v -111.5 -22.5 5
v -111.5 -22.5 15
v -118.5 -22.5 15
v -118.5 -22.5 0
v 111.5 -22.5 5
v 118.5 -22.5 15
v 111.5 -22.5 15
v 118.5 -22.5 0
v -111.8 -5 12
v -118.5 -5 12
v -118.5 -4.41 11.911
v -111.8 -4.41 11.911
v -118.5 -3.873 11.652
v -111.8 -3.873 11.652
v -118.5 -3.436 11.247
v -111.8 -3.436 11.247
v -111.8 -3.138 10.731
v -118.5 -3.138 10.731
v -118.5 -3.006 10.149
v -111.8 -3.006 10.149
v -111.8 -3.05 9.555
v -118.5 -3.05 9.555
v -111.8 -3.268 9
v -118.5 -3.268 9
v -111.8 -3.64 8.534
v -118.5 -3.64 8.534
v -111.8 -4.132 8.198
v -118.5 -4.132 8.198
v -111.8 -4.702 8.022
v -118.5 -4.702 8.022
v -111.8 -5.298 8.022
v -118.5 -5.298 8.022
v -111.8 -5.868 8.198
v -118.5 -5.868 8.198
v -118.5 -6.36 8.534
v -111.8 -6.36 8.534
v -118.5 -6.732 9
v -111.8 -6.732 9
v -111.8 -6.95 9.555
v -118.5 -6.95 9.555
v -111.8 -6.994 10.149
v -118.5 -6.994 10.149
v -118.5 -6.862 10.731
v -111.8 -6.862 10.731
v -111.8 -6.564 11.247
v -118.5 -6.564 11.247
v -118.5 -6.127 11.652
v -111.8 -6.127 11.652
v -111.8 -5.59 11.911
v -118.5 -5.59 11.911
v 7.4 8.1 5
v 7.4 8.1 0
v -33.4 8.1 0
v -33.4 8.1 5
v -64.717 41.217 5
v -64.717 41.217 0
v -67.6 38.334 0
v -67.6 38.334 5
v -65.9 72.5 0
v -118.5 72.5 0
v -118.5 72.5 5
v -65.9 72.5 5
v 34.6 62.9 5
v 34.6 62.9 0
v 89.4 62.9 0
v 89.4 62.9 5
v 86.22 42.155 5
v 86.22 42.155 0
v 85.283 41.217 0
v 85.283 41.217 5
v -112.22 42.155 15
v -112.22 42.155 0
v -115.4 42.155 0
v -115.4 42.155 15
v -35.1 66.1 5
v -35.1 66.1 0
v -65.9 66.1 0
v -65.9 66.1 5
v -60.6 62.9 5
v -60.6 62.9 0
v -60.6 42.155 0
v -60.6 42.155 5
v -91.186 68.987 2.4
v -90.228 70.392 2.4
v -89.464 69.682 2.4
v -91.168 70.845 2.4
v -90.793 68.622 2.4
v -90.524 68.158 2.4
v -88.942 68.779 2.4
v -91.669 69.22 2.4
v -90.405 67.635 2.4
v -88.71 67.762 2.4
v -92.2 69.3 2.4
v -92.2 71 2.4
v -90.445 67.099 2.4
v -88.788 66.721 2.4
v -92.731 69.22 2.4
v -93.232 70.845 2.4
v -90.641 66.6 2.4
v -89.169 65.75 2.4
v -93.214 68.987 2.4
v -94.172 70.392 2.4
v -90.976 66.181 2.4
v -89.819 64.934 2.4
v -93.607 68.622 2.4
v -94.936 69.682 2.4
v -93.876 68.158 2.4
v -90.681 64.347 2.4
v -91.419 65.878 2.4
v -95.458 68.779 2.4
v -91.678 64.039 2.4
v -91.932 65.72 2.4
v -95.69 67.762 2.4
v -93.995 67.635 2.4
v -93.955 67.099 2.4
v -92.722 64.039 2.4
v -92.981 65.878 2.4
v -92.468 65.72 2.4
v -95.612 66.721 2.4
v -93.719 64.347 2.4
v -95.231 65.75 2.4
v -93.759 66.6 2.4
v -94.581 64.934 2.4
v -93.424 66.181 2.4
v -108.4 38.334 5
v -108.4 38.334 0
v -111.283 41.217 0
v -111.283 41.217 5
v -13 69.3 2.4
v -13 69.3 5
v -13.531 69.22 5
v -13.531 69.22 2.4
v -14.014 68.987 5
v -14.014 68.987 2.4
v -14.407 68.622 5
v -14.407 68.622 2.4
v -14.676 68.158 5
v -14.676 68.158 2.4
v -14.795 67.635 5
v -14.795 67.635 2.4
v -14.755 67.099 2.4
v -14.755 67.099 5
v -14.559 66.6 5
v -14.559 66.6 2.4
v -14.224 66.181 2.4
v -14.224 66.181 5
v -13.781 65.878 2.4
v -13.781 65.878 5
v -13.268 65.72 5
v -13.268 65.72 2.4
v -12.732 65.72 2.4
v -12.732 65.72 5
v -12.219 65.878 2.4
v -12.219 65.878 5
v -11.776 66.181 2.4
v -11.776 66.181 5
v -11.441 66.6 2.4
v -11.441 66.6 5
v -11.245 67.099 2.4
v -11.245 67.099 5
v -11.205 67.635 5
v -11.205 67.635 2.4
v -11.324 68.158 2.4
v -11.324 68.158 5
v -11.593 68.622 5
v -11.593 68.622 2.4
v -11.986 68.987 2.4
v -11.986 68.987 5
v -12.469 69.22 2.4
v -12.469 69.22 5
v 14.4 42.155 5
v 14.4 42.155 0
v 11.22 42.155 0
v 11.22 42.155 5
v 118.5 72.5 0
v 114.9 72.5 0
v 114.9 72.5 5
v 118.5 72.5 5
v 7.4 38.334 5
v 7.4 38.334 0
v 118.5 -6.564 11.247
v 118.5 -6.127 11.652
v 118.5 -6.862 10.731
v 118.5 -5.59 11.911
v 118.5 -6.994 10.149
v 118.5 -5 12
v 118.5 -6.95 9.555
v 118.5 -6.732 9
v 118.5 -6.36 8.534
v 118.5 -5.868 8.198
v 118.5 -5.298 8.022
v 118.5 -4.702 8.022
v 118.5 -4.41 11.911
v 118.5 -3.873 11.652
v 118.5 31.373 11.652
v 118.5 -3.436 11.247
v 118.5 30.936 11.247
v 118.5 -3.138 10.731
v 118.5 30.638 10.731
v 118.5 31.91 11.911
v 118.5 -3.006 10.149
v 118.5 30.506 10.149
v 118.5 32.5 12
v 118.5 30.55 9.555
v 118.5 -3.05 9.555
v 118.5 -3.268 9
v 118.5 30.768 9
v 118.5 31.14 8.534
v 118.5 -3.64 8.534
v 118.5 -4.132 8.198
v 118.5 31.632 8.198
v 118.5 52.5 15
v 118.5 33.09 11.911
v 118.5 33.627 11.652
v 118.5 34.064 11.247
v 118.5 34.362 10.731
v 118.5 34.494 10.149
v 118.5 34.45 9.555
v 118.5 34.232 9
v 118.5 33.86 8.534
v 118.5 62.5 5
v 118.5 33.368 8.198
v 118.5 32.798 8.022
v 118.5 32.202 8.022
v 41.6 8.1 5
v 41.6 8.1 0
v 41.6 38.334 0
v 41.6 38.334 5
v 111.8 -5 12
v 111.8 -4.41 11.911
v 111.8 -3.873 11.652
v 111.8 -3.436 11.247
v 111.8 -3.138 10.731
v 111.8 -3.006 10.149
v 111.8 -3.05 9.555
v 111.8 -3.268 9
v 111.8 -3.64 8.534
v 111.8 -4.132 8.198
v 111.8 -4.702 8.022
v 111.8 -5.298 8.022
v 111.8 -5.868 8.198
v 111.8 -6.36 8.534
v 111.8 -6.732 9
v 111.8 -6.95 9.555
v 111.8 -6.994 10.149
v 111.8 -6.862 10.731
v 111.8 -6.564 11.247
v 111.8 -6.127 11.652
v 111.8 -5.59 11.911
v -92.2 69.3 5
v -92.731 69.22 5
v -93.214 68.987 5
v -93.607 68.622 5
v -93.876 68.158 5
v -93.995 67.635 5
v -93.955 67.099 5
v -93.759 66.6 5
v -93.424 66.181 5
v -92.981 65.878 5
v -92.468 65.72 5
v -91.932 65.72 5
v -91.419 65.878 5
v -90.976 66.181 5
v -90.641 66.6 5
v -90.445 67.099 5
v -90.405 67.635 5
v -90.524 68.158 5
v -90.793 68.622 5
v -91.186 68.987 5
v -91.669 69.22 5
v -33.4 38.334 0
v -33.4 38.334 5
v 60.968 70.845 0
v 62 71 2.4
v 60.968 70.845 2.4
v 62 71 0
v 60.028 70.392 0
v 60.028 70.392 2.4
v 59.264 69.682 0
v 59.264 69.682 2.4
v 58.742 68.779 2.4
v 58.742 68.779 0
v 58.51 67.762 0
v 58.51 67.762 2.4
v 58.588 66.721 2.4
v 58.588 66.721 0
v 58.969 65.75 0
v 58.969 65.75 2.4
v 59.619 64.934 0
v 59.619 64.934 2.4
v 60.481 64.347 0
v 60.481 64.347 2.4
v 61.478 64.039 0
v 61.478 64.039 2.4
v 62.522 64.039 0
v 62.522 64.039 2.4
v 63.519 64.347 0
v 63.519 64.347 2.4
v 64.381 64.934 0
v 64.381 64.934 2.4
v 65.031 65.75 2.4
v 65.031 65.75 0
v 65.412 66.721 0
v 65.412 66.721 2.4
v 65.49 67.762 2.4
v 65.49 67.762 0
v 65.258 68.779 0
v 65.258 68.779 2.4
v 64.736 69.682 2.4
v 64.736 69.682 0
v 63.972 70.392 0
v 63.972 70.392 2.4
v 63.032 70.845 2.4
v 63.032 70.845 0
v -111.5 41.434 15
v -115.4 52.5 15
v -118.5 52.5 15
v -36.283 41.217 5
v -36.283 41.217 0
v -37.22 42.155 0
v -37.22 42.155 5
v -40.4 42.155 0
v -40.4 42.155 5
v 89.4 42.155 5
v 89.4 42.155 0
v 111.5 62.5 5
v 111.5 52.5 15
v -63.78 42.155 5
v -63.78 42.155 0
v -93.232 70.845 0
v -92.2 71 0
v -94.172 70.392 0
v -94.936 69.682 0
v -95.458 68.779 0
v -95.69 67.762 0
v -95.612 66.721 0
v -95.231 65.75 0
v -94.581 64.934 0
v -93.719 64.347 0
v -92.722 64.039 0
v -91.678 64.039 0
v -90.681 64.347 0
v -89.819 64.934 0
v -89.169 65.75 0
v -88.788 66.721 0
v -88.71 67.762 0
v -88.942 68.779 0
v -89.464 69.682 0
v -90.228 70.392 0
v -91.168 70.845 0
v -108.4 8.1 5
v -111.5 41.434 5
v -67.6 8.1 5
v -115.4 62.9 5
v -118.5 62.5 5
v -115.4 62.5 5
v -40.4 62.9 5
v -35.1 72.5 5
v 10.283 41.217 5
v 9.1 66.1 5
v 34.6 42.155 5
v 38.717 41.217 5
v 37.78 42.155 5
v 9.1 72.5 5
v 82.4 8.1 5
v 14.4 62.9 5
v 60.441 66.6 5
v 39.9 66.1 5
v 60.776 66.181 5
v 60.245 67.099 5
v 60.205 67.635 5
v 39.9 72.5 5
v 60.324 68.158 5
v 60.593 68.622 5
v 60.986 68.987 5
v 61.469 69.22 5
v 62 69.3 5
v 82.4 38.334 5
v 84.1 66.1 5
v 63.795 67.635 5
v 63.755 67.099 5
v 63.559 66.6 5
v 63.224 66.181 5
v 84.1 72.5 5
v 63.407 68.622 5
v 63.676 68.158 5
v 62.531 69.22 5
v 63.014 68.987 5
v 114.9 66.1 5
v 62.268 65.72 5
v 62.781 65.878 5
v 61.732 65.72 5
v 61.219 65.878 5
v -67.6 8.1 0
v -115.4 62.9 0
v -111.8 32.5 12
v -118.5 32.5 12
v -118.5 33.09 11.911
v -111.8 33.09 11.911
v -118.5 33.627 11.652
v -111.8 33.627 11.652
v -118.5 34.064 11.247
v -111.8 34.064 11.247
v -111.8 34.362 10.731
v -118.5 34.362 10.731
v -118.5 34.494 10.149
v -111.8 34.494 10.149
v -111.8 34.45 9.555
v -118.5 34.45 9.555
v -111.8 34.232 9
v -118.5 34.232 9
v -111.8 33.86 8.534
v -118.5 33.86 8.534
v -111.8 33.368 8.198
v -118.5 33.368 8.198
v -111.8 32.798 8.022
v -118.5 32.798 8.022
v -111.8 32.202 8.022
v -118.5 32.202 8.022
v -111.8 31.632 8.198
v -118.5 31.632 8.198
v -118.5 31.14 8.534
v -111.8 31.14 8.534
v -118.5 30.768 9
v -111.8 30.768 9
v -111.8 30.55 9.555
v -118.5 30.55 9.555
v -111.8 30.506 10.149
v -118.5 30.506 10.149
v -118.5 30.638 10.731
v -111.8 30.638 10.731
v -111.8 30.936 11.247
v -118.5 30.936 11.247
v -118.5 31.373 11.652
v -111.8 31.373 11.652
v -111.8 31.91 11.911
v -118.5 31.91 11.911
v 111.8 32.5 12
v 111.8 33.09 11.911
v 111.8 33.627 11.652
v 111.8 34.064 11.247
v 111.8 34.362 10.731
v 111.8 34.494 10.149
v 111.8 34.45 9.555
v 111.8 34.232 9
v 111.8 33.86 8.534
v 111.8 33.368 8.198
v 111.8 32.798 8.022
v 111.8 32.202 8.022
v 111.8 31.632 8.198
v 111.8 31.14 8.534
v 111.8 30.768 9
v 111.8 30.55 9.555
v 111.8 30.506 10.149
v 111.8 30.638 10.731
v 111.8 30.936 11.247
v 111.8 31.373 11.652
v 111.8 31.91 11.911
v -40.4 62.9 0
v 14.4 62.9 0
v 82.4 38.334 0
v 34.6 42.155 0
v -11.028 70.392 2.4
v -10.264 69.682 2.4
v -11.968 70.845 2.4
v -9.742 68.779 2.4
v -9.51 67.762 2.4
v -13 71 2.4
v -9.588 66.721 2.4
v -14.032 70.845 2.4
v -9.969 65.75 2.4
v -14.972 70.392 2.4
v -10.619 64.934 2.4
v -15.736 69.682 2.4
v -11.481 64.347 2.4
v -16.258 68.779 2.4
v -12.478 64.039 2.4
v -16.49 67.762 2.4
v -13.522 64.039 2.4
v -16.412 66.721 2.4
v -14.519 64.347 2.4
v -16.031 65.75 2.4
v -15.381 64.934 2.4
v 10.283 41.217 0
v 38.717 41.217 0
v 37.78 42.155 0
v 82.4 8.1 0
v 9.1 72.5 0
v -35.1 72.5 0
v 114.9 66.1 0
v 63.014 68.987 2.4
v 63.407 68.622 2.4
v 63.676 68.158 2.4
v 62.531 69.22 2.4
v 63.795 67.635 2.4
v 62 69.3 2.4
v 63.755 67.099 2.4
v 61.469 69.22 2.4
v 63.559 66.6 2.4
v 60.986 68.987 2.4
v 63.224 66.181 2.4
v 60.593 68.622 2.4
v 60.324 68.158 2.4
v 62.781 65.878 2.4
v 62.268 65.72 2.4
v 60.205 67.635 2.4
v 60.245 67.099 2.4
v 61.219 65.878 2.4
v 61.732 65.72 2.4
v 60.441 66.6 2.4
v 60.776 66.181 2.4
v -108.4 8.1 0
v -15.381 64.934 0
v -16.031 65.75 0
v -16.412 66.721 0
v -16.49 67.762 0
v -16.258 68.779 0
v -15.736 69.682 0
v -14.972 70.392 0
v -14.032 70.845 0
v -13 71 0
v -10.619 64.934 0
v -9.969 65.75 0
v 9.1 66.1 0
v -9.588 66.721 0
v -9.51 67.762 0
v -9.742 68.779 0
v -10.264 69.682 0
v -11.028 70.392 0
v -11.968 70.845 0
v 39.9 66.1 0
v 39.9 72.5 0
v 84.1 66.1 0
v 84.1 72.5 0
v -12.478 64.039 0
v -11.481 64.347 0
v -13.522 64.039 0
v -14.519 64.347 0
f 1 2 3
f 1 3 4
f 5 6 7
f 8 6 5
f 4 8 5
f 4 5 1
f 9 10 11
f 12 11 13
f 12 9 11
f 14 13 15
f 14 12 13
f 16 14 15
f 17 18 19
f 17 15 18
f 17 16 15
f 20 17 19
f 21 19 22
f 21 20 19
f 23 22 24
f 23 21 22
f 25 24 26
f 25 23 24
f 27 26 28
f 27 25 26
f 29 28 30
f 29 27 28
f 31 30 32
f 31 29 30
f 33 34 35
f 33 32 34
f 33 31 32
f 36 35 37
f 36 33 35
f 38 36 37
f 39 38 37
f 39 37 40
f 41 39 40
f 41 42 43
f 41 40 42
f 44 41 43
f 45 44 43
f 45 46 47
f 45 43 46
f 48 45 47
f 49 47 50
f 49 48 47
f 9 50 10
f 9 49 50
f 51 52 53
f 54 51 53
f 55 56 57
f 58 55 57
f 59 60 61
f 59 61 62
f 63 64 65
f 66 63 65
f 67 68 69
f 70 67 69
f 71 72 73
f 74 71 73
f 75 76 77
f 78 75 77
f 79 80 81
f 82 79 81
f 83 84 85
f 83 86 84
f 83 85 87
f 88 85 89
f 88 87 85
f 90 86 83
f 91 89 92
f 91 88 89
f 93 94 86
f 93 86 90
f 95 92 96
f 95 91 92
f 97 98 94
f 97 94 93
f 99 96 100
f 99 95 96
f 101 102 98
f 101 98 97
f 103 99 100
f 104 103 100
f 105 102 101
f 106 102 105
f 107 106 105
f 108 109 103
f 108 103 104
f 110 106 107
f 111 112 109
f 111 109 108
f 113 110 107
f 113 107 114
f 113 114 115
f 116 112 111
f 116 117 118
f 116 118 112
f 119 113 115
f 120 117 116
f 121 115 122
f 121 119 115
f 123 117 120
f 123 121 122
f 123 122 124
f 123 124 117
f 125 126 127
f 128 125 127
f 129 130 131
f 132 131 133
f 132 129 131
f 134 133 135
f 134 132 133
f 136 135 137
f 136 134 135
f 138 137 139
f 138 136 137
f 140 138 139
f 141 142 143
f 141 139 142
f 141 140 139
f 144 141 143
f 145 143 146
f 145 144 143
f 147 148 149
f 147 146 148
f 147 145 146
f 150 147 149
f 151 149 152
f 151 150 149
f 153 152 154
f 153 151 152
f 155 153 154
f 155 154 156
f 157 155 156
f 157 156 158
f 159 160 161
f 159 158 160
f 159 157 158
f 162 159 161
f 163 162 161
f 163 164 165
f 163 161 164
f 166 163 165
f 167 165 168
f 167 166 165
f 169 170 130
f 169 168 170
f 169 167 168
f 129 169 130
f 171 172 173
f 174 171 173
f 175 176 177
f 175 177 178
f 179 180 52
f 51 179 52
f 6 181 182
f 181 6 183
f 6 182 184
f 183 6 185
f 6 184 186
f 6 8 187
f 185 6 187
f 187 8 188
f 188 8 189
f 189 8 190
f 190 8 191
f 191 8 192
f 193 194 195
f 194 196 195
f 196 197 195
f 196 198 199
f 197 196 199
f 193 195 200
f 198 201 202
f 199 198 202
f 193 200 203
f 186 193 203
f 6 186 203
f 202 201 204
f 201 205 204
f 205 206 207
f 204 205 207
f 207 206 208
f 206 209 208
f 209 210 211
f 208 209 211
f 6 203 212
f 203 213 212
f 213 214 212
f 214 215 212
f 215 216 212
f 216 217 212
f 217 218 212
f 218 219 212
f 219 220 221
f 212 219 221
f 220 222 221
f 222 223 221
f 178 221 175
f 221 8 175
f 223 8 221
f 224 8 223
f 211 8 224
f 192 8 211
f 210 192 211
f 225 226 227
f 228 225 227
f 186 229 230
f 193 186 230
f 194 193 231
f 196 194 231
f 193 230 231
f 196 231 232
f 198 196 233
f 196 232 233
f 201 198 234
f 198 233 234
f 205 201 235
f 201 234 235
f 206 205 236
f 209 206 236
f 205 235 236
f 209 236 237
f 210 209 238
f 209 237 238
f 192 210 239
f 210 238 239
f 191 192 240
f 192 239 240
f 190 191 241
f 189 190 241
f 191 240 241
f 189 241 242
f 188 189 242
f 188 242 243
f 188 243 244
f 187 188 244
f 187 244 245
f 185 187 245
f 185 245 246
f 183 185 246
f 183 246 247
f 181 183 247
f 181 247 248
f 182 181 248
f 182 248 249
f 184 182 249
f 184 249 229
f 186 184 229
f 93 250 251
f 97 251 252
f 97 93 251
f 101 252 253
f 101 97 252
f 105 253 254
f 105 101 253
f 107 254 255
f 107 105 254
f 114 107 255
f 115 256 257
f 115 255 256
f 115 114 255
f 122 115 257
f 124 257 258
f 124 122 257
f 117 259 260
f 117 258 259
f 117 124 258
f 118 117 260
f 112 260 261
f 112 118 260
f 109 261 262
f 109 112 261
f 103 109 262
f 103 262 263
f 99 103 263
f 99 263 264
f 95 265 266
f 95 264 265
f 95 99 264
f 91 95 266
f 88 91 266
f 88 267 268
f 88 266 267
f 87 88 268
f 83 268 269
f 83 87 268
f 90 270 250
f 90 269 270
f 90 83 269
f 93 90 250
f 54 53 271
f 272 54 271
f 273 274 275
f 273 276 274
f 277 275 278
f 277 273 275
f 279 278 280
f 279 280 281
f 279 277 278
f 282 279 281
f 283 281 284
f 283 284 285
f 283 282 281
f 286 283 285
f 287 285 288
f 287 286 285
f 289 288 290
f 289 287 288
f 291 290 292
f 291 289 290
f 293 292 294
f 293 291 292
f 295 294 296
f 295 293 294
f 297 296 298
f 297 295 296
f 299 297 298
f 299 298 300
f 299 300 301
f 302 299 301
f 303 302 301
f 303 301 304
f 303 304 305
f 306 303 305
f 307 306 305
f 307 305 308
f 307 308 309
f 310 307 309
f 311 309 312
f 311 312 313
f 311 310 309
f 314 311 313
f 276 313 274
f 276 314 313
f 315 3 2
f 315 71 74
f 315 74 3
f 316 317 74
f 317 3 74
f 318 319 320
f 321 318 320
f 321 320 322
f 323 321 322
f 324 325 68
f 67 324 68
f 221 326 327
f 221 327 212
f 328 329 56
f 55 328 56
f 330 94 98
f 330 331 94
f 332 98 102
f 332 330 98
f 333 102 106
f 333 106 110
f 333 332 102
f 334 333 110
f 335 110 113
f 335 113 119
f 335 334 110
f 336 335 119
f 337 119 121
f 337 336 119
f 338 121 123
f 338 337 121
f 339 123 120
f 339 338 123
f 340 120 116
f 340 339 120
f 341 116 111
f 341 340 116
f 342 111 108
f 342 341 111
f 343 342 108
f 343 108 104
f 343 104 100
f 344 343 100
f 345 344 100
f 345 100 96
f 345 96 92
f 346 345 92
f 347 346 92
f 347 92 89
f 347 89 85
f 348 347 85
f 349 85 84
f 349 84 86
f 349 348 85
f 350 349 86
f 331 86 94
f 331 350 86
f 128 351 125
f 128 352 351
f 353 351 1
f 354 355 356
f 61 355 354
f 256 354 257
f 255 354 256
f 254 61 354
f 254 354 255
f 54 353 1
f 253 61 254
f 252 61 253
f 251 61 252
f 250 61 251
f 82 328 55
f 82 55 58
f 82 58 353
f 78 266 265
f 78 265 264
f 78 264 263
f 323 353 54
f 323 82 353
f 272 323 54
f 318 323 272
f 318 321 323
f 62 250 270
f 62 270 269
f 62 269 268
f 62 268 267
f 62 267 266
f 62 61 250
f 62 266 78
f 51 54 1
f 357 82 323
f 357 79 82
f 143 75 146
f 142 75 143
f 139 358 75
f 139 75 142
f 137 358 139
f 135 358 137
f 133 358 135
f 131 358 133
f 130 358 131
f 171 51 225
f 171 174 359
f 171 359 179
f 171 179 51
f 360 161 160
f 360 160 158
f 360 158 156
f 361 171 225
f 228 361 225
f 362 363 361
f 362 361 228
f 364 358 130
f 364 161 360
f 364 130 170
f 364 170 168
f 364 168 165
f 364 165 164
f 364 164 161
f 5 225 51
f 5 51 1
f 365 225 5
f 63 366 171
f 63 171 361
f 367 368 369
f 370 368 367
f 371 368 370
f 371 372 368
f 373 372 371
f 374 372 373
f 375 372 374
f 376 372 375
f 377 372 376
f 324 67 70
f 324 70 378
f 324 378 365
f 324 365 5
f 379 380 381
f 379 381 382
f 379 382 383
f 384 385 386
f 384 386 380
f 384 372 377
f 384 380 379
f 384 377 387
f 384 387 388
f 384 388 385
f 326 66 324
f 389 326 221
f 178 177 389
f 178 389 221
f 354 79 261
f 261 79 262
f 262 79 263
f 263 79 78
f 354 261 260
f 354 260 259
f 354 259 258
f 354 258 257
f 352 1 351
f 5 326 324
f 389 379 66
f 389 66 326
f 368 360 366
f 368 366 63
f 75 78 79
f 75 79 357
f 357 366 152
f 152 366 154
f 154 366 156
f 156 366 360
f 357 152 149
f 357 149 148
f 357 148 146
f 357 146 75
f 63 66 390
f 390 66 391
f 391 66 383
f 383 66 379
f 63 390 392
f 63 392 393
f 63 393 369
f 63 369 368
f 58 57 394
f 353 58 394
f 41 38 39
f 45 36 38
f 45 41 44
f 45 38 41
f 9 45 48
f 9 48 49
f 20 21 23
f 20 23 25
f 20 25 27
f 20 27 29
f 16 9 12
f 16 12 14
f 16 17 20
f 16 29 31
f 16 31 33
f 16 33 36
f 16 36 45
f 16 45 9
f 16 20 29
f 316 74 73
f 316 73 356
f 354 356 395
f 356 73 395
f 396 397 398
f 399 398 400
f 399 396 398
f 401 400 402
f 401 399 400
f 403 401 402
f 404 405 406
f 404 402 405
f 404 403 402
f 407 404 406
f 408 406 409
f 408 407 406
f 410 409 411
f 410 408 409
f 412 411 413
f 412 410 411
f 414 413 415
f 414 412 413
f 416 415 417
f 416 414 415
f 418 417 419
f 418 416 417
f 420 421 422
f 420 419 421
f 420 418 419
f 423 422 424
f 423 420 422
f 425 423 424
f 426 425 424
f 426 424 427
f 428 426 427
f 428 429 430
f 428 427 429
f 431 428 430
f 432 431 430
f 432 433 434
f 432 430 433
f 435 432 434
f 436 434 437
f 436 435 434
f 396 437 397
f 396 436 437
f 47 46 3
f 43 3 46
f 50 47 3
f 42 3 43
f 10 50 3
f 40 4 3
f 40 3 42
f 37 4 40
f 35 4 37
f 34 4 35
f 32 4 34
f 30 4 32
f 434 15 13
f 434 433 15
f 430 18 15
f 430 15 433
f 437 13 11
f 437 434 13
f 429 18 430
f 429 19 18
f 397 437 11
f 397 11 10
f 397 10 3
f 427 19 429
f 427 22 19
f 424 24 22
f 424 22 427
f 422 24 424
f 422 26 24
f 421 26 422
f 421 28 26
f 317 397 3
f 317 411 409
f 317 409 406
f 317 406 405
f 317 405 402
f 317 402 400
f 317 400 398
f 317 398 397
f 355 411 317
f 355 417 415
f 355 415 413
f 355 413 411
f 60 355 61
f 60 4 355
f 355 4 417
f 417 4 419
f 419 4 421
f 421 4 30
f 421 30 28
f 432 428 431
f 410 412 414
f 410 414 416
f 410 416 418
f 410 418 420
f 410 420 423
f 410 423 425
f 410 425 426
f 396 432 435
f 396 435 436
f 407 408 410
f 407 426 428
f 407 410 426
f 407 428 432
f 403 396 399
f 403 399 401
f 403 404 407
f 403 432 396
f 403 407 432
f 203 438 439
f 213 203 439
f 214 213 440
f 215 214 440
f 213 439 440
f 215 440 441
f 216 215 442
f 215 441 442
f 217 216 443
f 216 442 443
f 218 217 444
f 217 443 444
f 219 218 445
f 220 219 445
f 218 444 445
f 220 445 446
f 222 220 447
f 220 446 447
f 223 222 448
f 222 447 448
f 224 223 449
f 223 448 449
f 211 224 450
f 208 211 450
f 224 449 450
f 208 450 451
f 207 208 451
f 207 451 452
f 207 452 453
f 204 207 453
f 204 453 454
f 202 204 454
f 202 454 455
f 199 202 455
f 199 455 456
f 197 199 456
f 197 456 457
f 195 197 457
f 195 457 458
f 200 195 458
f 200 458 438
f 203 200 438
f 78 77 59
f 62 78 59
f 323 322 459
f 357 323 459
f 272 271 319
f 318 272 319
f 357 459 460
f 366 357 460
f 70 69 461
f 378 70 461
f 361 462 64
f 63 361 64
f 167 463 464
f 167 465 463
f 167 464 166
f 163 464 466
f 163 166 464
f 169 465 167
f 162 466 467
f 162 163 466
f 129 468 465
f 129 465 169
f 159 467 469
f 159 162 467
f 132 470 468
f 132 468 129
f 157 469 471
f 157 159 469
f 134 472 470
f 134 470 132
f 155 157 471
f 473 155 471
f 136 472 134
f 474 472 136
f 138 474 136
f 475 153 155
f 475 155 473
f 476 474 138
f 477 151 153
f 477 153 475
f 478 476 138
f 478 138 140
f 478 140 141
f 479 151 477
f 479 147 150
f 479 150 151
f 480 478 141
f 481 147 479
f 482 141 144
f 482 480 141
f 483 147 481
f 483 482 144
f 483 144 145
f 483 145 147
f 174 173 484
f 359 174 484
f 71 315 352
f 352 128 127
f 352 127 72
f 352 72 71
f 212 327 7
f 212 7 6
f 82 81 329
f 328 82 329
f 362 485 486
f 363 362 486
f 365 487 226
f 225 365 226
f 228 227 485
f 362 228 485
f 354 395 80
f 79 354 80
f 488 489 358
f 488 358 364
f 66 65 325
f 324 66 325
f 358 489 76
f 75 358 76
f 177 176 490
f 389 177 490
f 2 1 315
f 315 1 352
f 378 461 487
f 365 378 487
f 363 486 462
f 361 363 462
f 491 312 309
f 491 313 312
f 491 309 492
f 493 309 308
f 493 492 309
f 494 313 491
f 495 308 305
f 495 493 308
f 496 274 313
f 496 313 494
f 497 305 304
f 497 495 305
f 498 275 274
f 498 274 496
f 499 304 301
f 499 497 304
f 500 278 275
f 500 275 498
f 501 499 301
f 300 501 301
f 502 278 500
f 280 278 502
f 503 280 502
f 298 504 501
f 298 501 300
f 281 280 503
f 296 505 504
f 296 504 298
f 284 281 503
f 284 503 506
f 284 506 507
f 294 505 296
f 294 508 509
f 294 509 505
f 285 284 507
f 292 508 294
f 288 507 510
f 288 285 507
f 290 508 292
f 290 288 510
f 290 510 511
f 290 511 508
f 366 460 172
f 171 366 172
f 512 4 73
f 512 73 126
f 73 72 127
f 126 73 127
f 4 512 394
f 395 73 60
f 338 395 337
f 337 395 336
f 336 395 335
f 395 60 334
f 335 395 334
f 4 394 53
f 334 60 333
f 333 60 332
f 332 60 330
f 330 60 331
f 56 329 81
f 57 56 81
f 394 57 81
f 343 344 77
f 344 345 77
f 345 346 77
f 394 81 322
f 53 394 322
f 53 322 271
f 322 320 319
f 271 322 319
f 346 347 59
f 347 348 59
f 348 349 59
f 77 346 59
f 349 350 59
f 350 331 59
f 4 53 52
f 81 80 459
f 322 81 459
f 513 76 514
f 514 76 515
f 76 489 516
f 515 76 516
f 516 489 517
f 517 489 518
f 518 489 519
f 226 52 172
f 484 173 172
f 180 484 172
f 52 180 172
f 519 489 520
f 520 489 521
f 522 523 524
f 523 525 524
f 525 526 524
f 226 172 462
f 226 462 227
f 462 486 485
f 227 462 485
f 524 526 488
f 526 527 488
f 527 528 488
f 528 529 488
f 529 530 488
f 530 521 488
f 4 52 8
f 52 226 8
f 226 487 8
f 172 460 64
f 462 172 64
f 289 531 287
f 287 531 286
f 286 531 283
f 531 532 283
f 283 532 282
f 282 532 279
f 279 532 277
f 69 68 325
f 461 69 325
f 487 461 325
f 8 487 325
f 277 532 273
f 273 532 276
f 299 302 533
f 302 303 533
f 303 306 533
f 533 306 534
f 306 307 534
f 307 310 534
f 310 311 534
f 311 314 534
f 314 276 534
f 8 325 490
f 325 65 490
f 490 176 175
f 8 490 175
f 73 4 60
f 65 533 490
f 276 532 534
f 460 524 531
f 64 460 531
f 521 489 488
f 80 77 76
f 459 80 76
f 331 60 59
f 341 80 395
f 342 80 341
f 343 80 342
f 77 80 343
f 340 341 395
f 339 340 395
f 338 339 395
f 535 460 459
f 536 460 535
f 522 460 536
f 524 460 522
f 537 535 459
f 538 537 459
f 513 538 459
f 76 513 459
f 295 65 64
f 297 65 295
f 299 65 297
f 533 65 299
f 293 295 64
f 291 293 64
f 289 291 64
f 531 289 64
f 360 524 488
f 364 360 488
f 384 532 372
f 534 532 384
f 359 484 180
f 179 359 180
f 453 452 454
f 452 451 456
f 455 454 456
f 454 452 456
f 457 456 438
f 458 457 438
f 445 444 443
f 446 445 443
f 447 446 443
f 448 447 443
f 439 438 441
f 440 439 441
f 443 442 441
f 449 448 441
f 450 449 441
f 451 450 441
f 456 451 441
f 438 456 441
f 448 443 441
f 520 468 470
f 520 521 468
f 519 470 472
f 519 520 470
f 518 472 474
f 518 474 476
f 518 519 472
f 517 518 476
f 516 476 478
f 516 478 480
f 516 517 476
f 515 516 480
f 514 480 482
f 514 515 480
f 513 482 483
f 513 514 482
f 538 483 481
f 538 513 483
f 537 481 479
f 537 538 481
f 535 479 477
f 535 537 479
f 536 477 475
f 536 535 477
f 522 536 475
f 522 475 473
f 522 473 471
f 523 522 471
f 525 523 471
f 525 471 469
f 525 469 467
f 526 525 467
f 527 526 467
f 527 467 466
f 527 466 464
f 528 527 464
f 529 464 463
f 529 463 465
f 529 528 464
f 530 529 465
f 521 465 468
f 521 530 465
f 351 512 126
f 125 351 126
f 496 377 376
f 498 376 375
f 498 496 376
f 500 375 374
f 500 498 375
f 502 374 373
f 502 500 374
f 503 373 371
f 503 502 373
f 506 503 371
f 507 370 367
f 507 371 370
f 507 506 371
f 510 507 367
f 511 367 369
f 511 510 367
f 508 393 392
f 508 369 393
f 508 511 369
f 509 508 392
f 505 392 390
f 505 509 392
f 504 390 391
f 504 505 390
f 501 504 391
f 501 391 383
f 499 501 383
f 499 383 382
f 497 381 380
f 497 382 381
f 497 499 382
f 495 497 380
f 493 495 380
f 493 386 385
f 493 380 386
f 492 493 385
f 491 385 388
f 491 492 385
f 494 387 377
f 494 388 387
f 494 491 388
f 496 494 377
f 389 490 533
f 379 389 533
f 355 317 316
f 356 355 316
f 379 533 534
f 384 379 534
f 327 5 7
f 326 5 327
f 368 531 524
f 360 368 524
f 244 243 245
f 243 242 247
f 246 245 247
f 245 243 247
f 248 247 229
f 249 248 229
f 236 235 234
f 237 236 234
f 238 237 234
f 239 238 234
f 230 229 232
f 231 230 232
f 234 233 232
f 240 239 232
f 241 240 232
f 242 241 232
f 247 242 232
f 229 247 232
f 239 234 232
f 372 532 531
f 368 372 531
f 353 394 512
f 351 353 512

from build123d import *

# Parameters (mm, degrees)
SZKIC1_W                                  = 237
SZKIC1_H                                  = 145
DODANIE_WYCI_GNI_CIE1_DEPTH               = 5
SZKIC2_W                                  = 7
SZKIC2_H                                  = 135
DODANIE_WYCI_GNI_CIE2_DEPTH               = 10
OTW_R_4_0_4_1_D                           = 4
OTW_R_4_0_4_1_DEPTH                       = 6.7
SFAZOWANIE1_SIZE                          = 10
WYTNIJ_WYCI_GNI_CIE1_REACH                = 141.727
SZKIC5_W                                  = 30
SZKIC5_H                                  = 6
POG_BIENIE_WALCOWE_POD_M3_RUB_Z_B_2_COUNT = 2
POG_BIENIE_WALCOWE_POD_M3_RUB_Z_B_2_PITCH = 75
POG_BIENIE_WALCOWE_POD_M3_RUB_Z_B_3_COUNT = 2
POG_BIENIE_WALCOWE_POD_M3_RUB_Z_B_3_PITCH = 154.2


with BuildPart() as part:
    # Szkic1 → Dodanie-wyciągnięcie1 (new body)
    with BuildSketch(Plane.XY):
        Rectangle(SZKIC1_W, SZKIC1_H)
    extrude(amount=DODANIE_WYCI_GNI_CIE1_DEPTH)

    # Szkic2 → Dodanie-wyciągnięcie2 (add)
    with BuildSketch(Plane.XY.offset(5)):
        with Locations((115, -5)):
            Rectangle(SZKIC2_W, SZKIC2_H)
        with Locations((-115, -5)):
            Rectangle(SZKIC2_W, SZKIC2_H)
    extrude(amount=DODANIE_WYCI_GNI_CIE2_DEPTH)

    # Otwór Ø4.0 (4)1
    with Locations(Plane(origin=(118.5, 0, 0), x_dir=(0, 0, -1), z_dir=(1, 0, 0))):
        with Locations((-10, -42.5), (-10, 32.5), (-10, -5)):
            otw_r_4_0_4_1 = Hole(OTW_R_4_0_4_1_D / 2, depth=OTW_R_4_0_4_1_DEPTH)

    # Lustro1: Otwór Ø4.0 (4)1 across plane
    add(otw_r_4_0_4_1.mirror(Plane.ZY), mode=Mode.SUBTRACT)

    # Sfazowanie1
    sfazowanie1_edges = [part.edges().sort_by_distance(p)[0] for p in [
        (-115, 62.5, 15),
        (115, 62.5, 15),
    ]]
    chamfer(sfazowanie1_edges, length=SFAZOWANIE1_SIZE - 0.0001)  # a hair under: the kernel refuses the full size

    # Szkic5 → Wytnij-wyciągnięcie1 (cut, up to next)
    with BuildSketch(Plane(origin=(0, 0, 0), x_dir=(-1, 0, 0), z_dir=(0, 0, -1)), mode=Mode.PRIVATE) as wytnij_wyci_gni_cie1_sk1:
        with Locations((-99.5, 69.5)):
            Rectangle(SZKIC5_W, SZKIC5_H)
    wytnij_wyci_gni_cie1_tool1 = extrude(wytnij_wyci_gni_cie1_sk1.sketch, amount=-WYTNIJ_WYCI_GNI_CIE1_REACH, mode=Mode.PRIVATE) & part.part
    # Szkic5 → Wytnij-wyciągnięcie1 (cut, up to next)
    with BuildSketch(Plane(origin=(0, 0, 0), x_dir=(-1, 0, 0), z_dir=(0, 0, -1)), mode=Mode.PRIVATE) as wytnij_wyci_gni_cie1_sk2:
        Polygon((-84.1, 72.5), (-84.5, 72.5), (-84.5, 66.5), (-114.5, 66.5), (-114.5, 72.5), (-114.9, 72.5), (-114.9, 66.1), (-84.1, 66.1), align=None)
    wytnij_wyci_gni_cie1_tool2 = extrude(wytnij_wyci_gni_cie1_sk2.sketch, amount=-WYTNIJ_WYCI_GNI_CIE1_REACH, mode=Mode.PRIVATE) & part.part
    # Szkic5 → Wytnij-wyciągnięcie1 (cut, up to next)
    with BuildSketch(Plane(origin=(0, 0, 0), x_dir=(-1, 0, 0), z_dir=(0, 0, -1)), mode=Mode.PRIVATE) as wytnij_wyci_gni_cie1_sk3:
        Polygon((-89.4, 62.9), (-89.4, 42.154636006), (-86.220321431, 42.154636006), (-85.282842712, 41.217157288), (-82.4, 38.334314575), (-82.4, 8.1), (-41.6, 8.1), (-41.6, 38.334314575), (-38.717157288, 41.217157288), (-37.779678569, 42.154636006), (-34.6, 42.154636006), (-34.6, 62.9), align=None)
        Polygon((-42, 8.5), (-42, 38.5), (-39, 41.5), (-38, 42.5), (-38, 42.554636006), (-35, 42.554636006), (-35, 62.5), (-89, 62.5), (-89, 42.554636006), (-86, 42.554636006), (-86, 42.5), (-85, 41.5), (-82, 38.5), (-82, 8.5), align=None, mode=Mode.SUBTRACT)
    wytnij_wyci_gni_cie1_tool3 = extrude(wytnij_wyci_gni_cie1_sk3.sketch, amount=-WYTNIJ_WYCI_GNI_CIE1_REACH, mode=Mode.PRIVATE) & part.part
    # Szkic5 → Wytnij-wyciągnięcie1 (cut, up to next)
    with BuildSketch(Plane(origin=(0, 0, 0), x_dir=(-1, 0, 0), z_dir=(0, 0, -1)), mode=Mode.PRIVATE) as wytnij_wyci_gni_cie1_sk4:
        Polygon((-82, 8.5), (-42, 8.5), (-42, 38.5), (-39, 41.5), (-38, 42.5), (-38, 42.554636006), (-35, 42.554636006), (-35, 62.5), (-89, 62.5), (-89, 42.554636006), (-86, 42.554636006), (-86, 42.5), (-85, 41.5), (-82, 38.5), align=None)
    wytnij_wyci_gni_cie1_tool4 = extrude(wytnij_wyci_gni_cie1_sk4.sketch, amount=-WYTNIJ_WYCI_GNI_CIE1_REACH, mode=Mode.PRIVATE) & part.part
    # Szkic5 → Wytnij-wyciągnięcie1 (cut, up to next)
    with BuildSketch(Plane(origin=(0, 0, 0), x_dir=(-1, 0, 0), z_dir=(0, 0, -1)), mode=Mode.PRIVATE) as wytnij_wyci_gni_cie1_sk5:
        Polygon((-14.4, 62.9), (-14.4, 42.154636006), (-11.220321431, 42.154636006), (-10.282842712, 41.217157288), (-7.4, 38.334314575), (-7.4, 8.1), (33.4, 8.1), (33.4, 38.334314575), (36.282842712, 41.217157288), (37.220321431, 42.154636006), (40.4, 42.154636006), (40.4, 62.9), align=None)
        Polygon((33, 8.5), (33, 38.5), (36, 41.5), (37, 42.5), (37, 42.554636006), (40, 42.554636006), (40, 62.5), (-14, 62.5), (-14, 42.554636006), (-11, 42.554636006), (-11, 42.5), (-10, 41.5), (-7, 38.5), (-7, 8.5), align=None, mode=Mode.SUBTRACT)
    wytnij_wyci_gni_cie1_tool5 = extrude(wytnij_wyci_gni_cie1_sk5.sketch, amount=-WYTNIJ_WYCI_GNI_CIE1_REACH, mode=Mode.PRIVATE) & part.part
    # Szkic5 → Wytnij-wyciągnięcie1 (cut, up to next)
    with BuildSketch(Plane(origin=(0, 0, 0), x_dir=(-1, 0, 0), z_dir=(0, 0, -1)), mode=Mode.PRIVATE) as wytnij_wyci_gni_cie1_sk6:
        Polygon((-7, 8.5), (33, 8.5), (33, 38.5), (36, 41.5), (37, 42.5), (37, 42.554636006), (40, 42.554636006), (40, 62.5), (-14, 62.5), (-14, 42.554636006), (-11, 42.554636006), (-11, 42.5), (-10, 41.5), (-7, 38.5), align=None)
    wytnij_wyci_gni_cie1_tool6 = extrude(wytnij_wyci_gni_cie1_sk6.sketch, amount=-WYTNIJ_WYCI_GNI_CIE1_REACH, mode=Mode.PRIVATE) & part.part
    # Szkic5 → Wytnij-wyciągnięcie1 (cut, up to next)
    with BuildSketch(Plane(origin=(0, 0, 0), x_dir=(-1, 0, 0), z_dir=(0, 0, -1)), mode=Mode.PRIVATE) as wytnij_wyci_gni_cie1_sk7:
        with Locations((-24.5, 69.5)):
            Rectangle(SZKIC5_W, SZKIC5_H)
    wytnij_wyci_gni_cie1_tool7 = extrude(wytnij_wyci_gni_cie1_sk7.sketch, amount=-WYTNIJ_WYCI_GNI_CIE1_REACH, mode=Mode.PRIVATE) & part.part
    # Szkic5 → Wytnij-wyciągnięcie1 (cut, up to next)
    with BuildSketch(Plane(origin=(0, 0, 0), x_dir=(-1, 0, 0), z_dir=(0, 0, -1)), mode=Mode.PRIVATE) as wytnij_wyci_gni_cie1_sk8:
        Polygon((-39.5, 72.5), (-39.9, 72.5), (-39.9, 66.1), (-9.1, 66.1), (-9.1, 72.5), (-9.5, 72.5), (-9.5, 66.5), (-39.5, 66.5), align=None)
    wytnij_wyci_gni_cie1_tool8 = extrude(wytnij_wyci_gni_cie1_sk8.sketch, amount=-WYTNIJ_WYCI_GNI_CIE1_REACH, mode=Mode.PRIVATE) & part.part
    # Szkic5 → Wytnij-wyciągnięcie1 (cut, up to next)
    with BuildSketch(Plane(origin=(0, 0, 0), x_dir=(-1, 0, 0), z_dir=(0, 0, -1)), mode=Mode.PRIVATE) as wytnij_wyci_gni_cie1_sk9:
        Polygon((60.6, 62.9), (60.6, 42.154636006), (63.779678569, 42.154636006), (64.717157288, 41.217157288), (67.6, 38.334314575), (67.6, 8.1), (108.4, 8.1), (108.4, 38.334314575), (111.282842712, 41.217157288), (112.220321431, 42.154636006), (115.4, 42.154636006), (115.4, 62.9), align=None)
        Polygon((108, 8.5), (108, 38.5), (111, 41.5), (112, 42.5), (112, 42.554636006), (115, 42.554636006), (115, 62.5), (61, 62.5), (61, 42.554636006), (64, 42.554636006), (64, 42.5), (65, 41.5), (68, 38.5), (68, 8.5), align=None, mode=Mode.SUBTRACT)
    wytnij_wyci_gni_cie1_tool9 = extrude(wytnij_wyci_gni_cie1_sk9.sketch, amount=-WYTNIJ_WYCI_GNI_CIE1_REACH, mode=Mode.PRIVATE) & part.part
    # Szkic5 → Wytnij-wyciągnięcie1 (cut, up to next)
    with BuildSketch(Plane(origin=(0, 0, 0), x_dir=(-1, 0, 0), z_dir=(0, 0, -1)), mode=Mode.PRIVATE) as wytnij_wyci_gni_cie1_sk10:
        Polygon((68, 8.5), (108, 8.5), (108, 38.5), (111, 41.5), (112, 42.5), (112, 42.554636006), (115, 42.554636006), (115, 62.5), (61, 62.5), (61, 42.554636006), (64, 42.554636006), (64, 42.5), (65, 41.5), (68, 38.5), align=None)
    wytnij_wyci_gni_cie1_tool10 = extrude(wytnij_wyci_gni_cie1_sk10.sketch, amount=-WYTNIJ_WYCI_GNI_CIE1_REACH, mode=Mode.PRIVATE) & part.part
    # Szkic5 → Wytnij-wyciągnięcie1 (cut, up to next)
    with BuildSketch(Plane(origin=(0, 0, 0), x_dir=(-1, 0, 0), z_dir=(0, 0, -1)), mode=Mode.PRIVATE) as wytnij_wyci_gni_cie1_sk11:
        with Locations((50.5, 69.5)):
            Rectangle(SZKIC5_W, SZKIC5_H)
    wytnij_wyci_gni_cie1_tool11 = extrude(wytnij_wyci_gni_cie1_sk11.sketch, amount=-WYTNIJ_WYCI_GNI_CIE1_REACH, mode=Mode.PRIVATE) & part.part
    # Szkic5 → Wytnij-wyciągnięcie1 (cut, up to next)
    with BuildSketch(Plane(origin=(0, 0, 0), x_dir=(-1, 0, 0), z_dir=(0, 0, -1)), mode=Mode.PRIVATE) as wytnij_wyci_gni_cie1_sk12:
        Polygon((35.5, 72.5), (35.1, 72.5), (35.1, 66.1), (65.9, 66.1), (65.9, 72.5), (65.5, 72.5), (65.5, 66.5), (35.5, 66.5), align=None)
    wytnij_wyci_gni_cie1_tool12 = extrude(wytnij_wyci_gni_cie1_sk12.sketch, amount=-WYTNIJ_WYCI_GNI_CIE1_REACH, mode=Mode.PRIVATE) & part.part
    add(wytnij_wyci_gni_cie1_tool1.solids().sort_by_distance((99.5, 69.5, 0))[0], mode=Mode.SUBTRACT)
    add(wytnij_wyci_gni_cie1_tool2.solids().sort_by_distance((84.3, 72.185421, 0))[0], mode=Mode.SUBTRACT)
    add(wytnij_wyci_gni_cie1_tool3.solids().sort_by_distance((89.322501, 52.527318, 0))[0], mode=Mode.SUBTRACT)
    add(wytnij_wyci_gni_cie1_tool4.solids().sort_by_distance((62, 37.474353, 0))[0], mode=Mode.SUBTRACT)
    add(wytnij_wyci_gni_cie1_tool5.solids().sort_by_distance((14.322501, 52.527318, 0))[0], mode=Mode.SUBTRACT)
    add(wytnij_wyci_gni_cie1_tool6.solids().sort_by_distance((-13, 37.474353, 0))[0], mode=Mode.SUBTRACT)
    add(wytnij_wyci_gni_cie1_tool7.solids().sort_by_distance((24.5, 69.5, 0))[0], mode=Mode.SUBTRACT)
    add(wytnij_wyci_gni_cie1_tool8.solids().sort_by_distance((39.7, 72.185421, 0))[0], mode=Mode.SUBTRACT)
    add(wytnij_wyci_gni_cie1_tool9.solids().sort_by_distance((-60.677499, 52.527318, 0))[0], mode=Mode.SUBTRACT)
    add(wytnij_wyci_gni_cie1_tool10.solids().sort_by_distance((-88, 37.474353, 0))[0], mode=Mode.SUBTRACT)
    add(wytnij_wyci_gni_cie1_tool11.solids().sort_by_distance((-50.5, 69.5, 0))[0], mode=Mode.SUBTRACT)
    add(wytnij_wyci_gni_cie1_tool12.solids().sort_by_distance((-65.814579, 69.5, 0))[0], mode=Mode.SUBTRACT)


with BuildPart() as body_2:
    # Podziel1: the piece on the far side of the plane
    add(part.part)
    split(bisect_by=Plane(origin=(0, -22.5, 0), x_dir=(0, 0, -1), z_dir=(0, -1, 0)), keep=Keep.BOTTOM)

    # Szkic7 → Pogłębienie walcowe pod M3 Śrubę z łbem stożkowym ściętym1 (revolve, cut)
    with BuildSketch(Plane(origin=(62, 67.5, 0), x_dir=(0, 1, 0), z_dir=(1, 0, 0))):
        Polygon((0, 0), (0, 7.781549114), (1.8, 6.7), (1.8, 2.4), (3.5, 2.4), (3.5, 0), align=None)
    pog_bienie_walcowe_pod_m3_rub_z_bem_s = revolve(axis=Axis((62, 67.5, -6.35), (0, 0, 1)), mode=Mode.SUBTRACT)

    # Pog_bienie walcowe pod M3 _rub_ z _b 2: Pogłębienie walcowe pod M3 Śrubę z łbem stożkowym ściętym1 ×2
    with Locations(*[(-i * POG_BIENIE_WALCOWE_POD_M3_RUB_Z_B_2_PITCH, 0, 0) for i in range(1, POG_BIENIE_WALCOWE_POD_M3_RUB_Z_B_2_COUNT)]):
        add(pog_bienie_walcowe_pod_m3_rub_z_bem_s, mode=Mode.SUBTRACT)

    # Pog_bienie walcowe pod M3 _rub_ z _b 3: Pogłębienie walcowe pod M3 Śrubę z łbem stożkowym ściętym1 ×2
    with Locations(*[(-i * POG_BIENIE_WALCOWE_POD_M3_RUB_Z_B_3_PITCH, 0, 0) for i in range(1, POG_BIENIE_WALCOWE_POD_M3_RUB_Z_B_3_COUNT)]):
        add(pog_bienie_walcowe_pod_m3_rub_z_bem_s, mode=Mode.SUBTRACT)


with BuildPart() as part_1:
    add(part.part)

    # Podziel1
    split(bisect_by=Plane(origin=(0, -22.5, 0), x_dir=(0, 0, -1), z_dir=(0, -1, 0)), keep=Keep.TOP)


solid = body_2.part
